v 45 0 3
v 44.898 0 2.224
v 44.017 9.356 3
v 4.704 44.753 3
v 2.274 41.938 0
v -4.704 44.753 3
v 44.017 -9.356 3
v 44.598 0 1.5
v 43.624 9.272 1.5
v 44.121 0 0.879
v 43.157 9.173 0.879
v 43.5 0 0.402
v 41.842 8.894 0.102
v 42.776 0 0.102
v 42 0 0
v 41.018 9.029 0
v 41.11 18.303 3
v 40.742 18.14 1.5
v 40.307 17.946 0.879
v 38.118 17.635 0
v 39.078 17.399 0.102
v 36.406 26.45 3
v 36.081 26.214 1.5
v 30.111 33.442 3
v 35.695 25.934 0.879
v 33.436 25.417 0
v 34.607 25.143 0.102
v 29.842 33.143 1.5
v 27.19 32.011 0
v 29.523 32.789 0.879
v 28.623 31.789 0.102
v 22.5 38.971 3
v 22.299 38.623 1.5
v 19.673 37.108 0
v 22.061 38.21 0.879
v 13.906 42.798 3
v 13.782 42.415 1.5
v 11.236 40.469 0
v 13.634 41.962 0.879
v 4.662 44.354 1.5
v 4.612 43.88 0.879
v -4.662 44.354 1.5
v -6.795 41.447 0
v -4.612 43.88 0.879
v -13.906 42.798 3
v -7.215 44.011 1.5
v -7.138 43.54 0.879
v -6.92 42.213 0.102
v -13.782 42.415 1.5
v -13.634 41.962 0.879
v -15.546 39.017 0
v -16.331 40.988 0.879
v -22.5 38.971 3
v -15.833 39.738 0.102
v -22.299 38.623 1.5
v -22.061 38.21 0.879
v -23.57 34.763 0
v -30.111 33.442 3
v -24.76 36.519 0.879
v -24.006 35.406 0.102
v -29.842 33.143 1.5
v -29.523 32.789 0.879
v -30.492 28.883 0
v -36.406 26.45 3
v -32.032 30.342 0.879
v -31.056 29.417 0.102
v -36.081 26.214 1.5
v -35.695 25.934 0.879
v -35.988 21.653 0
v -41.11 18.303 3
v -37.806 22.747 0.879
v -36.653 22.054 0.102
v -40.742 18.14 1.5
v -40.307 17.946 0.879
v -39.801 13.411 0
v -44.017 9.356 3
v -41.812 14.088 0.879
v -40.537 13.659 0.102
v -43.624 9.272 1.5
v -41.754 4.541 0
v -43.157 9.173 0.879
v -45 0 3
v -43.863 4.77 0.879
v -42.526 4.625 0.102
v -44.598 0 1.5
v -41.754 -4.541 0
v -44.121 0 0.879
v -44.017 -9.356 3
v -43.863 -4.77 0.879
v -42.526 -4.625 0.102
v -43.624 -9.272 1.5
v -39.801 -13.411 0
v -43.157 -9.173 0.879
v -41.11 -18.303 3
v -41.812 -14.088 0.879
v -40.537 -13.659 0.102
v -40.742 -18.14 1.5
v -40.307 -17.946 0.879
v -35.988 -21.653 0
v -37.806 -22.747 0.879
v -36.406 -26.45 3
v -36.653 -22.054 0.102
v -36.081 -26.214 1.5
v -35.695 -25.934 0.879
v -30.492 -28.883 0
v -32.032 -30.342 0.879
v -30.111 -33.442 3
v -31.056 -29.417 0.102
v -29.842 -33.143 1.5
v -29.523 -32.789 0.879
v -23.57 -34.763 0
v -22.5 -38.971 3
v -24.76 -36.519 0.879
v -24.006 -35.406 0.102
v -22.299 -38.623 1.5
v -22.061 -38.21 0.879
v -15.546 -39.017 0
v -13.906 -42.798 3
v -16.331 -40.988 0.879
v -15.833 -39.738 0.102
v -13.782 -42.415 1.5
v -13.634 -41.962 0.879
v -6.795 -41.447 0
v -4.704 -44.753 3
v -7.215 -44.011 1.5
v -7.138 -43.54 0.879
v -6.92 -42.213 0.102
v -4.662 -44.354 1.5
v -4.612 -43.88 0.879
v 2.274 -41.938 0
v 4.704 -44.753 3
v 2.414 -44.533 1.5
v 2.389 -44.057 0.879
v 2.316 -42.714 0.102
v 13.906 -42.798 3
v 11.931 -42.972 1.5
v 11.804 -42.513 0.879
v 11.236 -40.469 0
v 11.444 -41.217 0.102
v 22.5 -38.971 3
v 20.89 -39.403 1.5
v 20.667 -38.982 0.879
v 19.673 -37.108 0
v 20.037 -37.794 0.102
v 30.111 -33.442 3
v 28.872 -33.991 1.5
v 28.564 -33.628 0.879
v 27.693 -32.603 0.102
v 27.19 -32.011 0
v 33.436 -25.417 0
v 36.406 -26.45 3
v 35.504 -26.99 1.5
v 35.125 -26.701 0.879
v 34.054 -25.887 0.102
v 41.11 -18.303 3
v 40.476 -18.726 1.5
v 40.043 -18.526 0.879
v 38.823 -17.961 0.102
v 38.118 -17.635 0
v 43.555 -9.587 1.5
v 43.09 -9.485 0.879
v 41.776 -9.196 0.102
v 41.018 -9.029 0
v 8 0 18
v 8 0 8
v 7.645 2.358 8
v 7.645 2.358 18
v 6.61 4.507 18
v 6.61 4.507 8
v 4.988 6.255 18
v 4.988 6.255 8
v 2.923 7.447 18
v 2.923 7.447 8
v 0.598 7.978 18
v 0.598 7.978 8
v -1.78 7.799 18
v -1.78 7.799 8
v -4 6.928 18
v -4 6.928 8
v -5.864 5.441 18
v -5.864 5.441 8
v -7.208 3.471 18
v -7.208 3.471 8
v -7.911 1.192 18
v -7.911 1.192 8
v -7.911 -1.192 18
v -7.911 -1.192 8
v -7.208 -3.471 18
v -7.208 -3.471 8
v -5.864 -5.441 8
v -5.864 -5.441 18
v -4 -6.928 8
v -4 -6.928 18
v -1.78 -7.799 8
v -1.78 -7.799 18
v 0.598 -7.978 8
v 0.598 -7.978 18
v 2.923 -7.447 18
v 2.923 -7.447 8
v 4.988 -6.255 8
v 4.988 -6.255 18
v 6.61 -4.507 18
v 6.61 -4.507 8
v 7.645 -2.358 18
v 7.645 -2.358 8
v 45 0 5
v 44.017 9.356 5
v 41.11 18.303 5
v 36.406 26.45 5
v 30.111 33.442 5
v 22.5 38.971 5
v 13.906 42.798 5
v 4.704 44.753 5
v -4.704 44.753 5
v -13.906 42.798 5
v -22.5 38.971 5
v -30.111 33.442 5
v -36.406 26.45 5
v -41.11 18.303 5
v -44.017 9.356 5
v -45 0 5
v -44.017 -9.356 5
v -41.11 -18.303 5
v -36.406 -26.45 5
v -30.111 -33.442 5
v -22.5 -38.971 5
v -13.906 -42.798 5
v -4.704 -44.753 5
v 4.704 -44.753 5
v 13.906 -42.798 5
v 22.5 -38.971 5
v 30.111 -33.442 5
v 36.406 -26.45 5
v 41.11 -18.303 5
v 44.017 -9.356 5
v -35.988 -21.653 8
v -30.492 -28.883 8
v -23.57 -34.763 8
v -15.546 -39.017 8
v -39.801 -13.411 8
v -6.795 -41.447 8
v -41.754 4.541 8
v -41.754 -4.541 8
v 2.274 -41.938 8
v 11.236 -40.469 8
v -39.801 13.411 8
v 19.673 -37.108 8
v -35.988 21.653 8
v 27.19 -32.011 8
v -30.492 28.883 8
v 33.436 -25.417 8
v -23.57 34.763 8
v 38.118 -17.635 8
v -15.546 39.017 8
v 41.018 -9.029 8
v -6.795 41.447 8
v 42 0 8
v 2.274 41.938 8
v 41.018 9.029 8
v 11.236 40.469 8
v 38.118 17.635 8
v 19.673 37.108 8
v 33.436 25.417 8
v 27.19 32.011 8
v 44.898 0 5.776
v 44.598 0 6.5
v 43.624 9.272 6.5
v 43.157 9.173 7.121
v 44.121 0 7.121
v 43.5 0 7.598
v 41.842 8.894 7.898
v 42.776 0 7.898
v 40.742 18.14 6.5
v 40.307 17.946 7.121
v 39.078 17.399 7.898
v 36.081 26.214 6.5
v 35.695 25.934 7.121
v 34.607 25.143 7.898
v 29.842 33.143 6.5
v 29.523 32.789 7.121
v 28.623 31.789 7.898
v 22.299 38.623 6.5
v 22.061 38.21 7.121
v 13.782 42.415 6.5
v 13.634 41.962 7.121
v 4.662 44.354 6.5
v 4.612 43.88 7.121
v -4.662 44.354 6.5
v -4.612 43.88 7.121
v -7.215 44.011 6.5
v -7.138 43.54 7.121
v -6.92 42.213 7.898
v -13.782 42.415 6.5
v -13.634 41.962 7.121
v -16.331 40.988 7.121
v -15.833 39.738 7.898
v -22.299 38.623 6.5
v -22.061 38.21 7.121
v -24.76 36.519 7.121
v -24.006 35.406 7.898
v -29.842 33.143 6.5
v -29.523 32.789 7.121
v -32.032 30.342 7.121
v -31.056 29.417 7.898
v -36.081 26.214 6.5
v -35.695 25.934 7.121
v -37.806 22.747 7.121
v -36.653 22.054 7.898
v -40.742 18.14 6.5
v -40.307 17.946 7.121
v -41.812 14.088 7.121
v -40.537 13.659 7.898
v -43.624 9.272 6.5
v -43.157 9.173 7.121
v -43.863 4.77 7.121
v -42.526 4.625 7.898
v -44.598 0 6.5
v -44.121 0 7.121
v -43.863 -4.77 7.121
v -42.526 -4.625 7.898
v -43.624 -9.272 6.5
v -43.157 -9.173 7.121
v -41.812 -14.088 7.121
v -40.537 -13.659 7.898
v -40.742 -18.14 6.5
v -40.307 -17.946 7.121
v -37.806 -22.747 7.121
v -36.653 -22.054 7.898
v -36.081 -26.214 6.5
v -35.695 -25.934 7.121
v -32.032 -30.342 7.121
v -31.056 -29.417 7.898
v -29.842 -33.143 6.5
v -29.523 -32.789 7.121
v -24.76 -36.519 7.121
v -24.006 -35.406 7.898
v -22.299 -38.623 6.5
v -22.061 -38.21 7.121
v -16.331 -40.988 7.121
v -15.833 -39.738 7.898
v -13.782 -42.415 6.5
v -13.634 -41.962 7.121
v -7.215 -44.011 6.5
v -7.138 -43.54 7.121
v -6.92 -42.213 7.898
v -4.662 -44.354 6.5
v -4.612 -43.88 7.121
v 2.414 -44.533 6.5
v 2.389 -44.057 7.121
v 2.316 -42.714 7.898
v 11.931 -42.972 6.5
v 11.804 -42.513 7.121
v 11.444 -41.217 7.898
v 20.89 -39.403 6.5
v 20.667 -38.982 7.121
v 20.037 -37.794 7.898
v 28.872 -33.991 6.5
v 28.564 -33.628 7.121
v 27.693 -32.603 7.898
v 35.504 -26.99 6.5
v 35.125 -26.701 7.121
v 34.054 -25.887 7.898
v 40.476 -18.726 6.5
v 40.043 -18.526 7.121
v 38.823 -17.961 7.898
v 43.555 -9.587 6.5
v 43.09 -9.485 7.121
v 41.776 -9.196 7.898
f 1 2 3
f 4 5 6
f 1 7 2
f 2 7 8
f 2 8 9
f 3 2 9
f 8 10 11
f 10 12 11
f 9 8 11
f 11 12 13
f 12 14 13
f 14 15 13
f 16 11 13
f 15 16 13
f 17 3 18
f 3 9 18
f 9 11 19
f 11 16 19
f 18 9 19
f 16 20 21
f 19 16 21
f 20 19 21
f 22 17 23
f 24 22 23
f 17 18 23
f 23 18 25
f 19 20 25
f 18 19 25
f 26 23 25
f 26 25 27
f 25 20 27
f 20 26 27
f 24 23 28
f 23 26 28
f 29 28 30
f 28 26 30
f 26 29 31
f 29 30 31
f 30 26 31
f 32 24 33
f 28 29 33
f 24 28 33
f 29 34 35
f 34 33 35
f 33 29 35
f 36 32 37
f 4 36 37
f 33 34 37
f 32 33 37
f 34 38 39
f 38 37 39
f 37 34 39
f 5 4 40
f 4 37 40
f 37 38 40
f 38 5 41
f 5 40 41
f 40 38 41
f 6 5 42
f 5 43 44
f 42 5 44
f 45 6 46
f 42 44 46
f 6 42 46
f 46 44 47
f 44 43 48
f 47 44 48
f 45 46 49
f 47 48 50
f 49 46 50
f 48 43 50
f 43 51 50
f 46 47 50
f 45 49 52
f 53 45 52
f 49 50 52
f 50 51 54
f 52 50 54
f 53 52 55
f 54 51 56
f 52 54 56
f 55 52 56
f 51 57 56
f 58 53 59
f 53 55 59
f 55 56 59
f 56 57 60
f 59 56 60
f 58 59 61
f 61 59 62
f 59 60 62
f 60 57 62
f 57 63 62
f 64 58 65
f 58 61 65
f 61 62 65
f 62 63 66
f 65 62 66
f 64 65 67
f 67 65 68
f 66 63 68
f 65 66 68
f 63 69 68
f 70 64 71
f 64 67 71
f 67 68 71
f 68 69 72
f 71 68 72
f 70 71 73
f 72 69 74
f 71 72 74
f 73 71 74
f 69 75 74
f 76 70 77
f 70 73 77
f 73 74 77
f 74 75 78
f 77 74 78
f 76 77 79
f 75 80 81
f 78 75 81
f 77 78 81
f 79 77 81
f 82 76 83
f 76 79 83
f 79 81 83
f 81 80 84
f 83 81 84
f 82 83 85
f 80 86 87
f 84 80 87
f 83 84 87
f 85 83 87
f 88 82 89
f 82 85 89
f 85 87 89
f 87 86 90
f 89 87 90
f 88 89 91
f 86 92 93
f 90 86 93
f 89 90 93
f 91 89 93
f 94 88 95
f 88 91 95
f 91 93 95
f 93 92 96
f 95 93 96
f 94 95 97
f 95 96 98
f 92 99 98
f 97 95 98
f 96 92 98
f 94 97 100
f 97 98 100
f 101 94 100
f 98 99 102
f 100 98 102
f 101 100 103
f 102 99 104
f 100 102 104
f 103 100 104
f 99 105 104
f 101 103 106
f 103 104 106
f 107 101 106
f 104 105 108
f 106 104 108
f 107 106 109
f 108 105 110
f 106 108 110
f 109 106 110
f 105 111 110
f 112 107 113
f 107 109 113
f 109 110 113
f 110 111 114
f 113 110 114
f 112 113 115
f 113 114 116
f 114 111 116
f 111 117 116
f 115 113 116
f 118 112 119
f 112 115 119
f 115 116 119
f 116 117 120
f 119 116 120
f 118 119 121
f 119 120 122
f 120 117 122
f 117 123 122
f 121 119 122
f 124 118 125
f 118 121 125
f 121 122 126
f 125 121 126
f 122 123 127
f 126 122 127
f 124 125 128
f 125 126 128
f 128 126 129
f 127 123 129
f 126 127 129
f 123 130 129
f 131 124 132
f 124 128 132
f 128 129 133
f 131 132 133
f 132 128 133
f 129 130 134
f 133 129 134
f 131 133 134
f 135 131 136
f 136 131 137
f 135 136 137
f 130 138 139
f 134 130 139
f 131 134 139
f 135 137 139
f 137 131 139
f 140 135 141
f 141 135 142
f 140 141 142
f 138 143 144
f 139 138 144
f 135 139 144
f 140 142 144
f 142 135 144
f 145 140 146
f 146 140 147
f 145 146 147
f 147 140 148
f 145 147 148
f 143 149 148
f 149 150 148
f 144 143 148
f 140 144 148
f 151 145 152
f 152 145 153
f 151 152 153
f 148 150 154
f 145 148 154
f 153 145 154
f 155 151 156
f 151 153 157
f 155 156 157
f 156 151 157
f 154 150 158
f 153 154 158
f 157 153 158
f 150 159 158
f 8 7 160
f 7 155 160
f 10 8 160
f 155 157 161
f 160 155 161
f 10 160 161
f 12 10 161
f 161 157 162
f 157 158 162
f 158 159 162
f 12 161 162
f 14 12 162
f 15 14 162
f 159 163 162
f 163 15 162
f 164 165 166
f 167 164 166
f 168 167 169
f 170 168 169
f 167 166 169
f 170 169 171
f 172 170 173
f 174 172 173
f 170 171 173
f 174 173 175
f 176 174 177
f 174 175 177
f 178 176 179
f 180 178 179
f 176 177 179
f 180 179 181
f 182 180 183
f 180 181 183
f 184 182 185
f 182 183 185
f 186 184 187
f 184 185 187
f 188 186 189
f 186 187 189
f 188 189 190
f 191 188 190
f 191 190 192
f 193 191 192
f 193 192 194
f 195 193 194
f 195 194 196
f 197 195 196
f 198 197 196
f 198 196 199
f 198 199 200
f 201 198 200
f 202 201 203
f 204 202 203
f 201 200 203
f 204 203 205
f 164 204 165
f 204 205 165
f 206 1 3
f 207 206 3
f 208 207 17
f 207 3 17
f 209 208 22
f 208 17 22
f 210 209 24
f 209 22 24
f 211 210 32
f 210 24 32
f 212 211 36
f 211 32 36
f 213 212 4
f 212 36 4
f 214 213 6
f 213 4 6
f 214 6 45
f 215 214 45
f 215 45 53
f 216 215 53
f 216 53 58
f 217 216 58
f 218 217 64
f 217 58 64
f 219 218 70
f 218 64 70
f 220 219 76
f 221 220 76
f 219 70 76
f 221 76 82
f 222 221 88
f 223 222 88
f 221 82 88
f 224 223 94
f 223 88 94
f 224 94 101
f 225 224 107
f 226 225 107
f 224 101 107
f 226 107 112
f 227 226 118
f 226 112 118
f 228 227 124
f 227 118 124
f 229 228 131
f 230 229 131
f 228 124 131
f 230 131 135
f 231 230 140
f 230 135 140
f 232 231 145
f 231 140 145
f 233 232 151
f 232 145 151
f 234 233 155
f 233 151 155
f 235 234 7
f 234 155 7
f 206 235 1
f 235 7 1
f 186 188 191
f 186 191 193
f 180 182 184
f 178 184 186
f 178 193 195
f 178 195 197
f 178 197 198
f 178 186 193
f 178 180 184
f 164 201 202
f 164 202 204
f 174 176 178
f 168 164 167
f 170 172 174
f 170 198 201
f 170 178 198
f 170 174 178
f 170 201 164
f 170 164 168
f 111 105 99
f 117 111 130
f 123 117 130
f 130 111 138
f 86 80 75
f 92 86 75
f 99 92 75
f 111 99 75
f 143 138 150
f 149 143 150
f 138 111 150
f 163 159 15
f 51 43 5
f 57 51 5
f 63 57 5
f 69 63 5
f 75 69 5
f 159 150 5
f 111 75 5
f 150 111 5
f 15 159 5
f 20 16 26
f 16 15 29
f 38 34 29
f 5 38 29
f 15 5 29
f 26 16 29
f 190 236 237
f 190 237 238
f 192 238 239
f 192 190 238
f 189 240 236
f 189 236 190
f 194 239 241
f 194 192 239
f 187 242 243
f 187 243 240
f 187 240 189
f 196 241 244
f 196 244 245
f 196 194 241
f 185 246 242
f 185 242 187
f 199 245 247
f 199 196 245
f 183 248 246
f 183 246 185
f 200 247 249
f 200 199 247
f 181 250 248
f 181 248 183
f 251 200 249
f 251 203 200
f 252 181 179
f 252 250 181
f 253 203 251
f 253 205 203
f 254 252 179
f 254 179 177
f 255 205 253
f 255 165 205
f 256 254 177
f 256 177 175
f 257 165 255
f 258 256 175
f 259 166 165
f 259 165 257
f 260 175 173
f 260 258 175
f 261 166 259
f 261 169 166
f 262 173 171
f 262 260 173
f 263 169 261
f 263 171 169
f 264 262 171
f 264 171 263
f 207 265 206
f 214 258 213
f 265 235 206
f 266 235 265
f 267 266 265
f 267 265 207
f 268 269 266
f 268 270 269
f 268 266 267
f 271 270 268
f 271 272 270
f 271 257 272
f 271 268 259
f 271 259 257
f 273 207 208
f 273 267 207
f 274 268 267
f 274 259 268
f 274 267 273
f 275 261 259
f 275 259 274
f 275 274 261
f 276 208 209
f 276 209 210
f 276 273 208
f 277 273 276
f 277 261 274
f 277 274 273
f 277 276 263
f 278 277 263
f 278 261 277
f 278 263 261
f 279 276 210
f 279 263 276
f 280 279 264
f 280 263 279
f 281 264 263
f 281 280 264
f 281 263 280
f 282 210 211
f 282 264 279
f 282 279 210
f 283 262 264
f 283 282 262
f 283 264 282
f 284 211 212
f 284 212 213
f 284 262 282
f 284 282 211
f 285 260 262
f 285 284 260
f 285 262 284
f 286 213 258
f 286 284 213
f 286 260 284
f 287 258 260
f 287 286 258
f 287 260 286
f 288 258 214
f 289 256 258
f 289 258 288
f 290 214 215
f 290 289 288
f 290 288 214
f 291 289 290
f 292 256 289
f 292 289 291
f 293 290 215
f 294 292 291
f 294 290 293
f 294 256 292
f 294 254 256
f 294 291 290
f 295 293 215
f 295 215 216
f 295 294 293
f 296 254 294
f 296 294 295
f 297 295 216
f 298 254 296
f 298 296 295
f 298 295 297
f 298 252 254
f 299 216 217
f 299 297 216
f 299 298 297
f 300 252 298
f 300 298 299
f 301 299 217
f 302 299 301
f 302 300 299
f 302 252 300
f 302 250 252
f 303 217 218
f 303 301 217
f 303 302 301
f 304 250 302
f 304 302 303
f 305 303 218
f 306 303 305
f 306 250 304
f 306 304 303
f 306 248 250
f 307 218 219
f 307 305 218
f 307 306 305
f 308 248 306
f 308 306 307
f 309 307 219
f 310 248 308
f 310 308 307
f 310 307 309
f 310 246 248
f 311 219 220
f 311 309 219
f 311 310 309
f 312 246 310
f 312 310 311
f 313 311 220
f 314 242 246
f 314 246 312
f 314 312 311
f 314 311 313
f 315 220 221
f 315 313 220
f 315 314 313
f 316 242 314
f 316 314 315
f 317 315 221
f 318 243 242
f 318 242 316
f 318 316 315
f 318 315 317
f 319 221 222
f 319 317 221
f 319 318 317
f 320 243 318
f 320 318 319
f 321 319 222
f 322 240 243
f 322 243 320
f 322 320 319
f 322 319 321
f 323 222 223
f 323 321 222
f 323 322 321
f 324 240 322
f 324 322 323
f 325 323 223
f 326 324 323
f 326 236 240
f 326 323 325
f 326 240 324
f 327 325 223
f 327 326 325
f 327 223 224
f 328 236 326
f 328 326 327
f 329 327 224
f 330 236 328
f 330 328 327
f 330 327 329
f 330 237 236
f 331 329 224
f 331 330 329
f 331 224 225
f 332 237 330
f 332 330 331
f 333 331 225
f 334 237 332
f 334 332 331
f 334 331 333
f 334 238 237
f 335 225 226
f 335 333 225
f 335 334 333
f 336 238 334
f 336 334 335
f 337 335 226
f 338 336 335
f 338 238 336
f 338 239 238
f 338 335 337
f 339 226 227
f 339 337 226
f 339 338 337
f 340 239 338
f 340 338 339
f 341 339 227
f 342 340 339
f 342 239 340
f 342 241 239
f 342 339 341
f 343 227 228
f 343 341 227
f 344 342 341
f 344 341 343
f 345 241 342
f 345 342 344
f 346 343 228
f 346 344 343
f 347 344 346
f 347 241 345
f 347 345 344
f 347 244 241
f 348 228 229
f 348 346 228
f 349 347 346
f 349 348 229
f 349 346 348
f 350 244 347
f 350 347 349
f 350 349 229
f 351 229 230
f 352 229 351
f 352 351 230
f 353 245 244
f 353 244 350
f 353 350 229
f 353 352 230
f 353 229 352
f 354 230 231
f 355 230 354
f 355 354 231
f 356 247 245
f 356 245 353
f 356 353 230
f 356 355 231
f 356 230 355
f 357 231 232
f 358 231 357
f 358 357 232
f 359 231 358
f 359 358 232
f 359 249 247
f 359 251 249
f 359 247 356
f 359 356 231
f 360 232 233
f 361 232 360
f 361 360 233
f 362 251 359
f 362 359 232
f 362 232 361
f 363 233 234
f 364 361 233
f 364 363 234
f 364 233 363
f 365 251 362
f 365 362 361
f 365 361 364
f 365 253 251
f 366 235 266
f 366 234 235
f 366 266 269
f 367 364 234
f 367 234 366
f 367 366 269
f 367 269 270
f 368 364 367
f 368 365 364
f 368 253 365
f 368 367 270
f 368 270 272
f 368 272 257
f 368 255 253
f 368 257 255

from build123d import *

# Parameters (mm, degrees)
CROQUIS1_R              = 45
SALIENTE_EXTRUIR1_DEPTH = 8
CROQUIS2_R              = 8
SALIENTE_EXTRUIR2_DEPTH = 10
REDONDEO1_R             = 3


with BuildPart() as part:
    # Croquis1 → Saliente-Extruir1 (new body)
    with BuildSketch(Plane.XY):
        Circle(CROQUIS1_R)
    extrude(amount=SALIENTE_EXTRUIR1_DEPTH)

    # Croquis2 → Saliente-Extruir2 (add)
    with BuildSketch(Plane.XY.offset(8)):
        Circle(CROQUIS2_R)
    extrude(amount=SALIENTE_EXTRUIR2_DEPTH)

    # Redondeo1
    redondeo1_edges = [part.edges().sort_by_distance(p)[0] for p in [
        (-45, 0, 0),
        (-45, 0, 8),
    ]]
    fillet(redondeo1_edges, radius=REDONDEO1_R)


solid = part.part
